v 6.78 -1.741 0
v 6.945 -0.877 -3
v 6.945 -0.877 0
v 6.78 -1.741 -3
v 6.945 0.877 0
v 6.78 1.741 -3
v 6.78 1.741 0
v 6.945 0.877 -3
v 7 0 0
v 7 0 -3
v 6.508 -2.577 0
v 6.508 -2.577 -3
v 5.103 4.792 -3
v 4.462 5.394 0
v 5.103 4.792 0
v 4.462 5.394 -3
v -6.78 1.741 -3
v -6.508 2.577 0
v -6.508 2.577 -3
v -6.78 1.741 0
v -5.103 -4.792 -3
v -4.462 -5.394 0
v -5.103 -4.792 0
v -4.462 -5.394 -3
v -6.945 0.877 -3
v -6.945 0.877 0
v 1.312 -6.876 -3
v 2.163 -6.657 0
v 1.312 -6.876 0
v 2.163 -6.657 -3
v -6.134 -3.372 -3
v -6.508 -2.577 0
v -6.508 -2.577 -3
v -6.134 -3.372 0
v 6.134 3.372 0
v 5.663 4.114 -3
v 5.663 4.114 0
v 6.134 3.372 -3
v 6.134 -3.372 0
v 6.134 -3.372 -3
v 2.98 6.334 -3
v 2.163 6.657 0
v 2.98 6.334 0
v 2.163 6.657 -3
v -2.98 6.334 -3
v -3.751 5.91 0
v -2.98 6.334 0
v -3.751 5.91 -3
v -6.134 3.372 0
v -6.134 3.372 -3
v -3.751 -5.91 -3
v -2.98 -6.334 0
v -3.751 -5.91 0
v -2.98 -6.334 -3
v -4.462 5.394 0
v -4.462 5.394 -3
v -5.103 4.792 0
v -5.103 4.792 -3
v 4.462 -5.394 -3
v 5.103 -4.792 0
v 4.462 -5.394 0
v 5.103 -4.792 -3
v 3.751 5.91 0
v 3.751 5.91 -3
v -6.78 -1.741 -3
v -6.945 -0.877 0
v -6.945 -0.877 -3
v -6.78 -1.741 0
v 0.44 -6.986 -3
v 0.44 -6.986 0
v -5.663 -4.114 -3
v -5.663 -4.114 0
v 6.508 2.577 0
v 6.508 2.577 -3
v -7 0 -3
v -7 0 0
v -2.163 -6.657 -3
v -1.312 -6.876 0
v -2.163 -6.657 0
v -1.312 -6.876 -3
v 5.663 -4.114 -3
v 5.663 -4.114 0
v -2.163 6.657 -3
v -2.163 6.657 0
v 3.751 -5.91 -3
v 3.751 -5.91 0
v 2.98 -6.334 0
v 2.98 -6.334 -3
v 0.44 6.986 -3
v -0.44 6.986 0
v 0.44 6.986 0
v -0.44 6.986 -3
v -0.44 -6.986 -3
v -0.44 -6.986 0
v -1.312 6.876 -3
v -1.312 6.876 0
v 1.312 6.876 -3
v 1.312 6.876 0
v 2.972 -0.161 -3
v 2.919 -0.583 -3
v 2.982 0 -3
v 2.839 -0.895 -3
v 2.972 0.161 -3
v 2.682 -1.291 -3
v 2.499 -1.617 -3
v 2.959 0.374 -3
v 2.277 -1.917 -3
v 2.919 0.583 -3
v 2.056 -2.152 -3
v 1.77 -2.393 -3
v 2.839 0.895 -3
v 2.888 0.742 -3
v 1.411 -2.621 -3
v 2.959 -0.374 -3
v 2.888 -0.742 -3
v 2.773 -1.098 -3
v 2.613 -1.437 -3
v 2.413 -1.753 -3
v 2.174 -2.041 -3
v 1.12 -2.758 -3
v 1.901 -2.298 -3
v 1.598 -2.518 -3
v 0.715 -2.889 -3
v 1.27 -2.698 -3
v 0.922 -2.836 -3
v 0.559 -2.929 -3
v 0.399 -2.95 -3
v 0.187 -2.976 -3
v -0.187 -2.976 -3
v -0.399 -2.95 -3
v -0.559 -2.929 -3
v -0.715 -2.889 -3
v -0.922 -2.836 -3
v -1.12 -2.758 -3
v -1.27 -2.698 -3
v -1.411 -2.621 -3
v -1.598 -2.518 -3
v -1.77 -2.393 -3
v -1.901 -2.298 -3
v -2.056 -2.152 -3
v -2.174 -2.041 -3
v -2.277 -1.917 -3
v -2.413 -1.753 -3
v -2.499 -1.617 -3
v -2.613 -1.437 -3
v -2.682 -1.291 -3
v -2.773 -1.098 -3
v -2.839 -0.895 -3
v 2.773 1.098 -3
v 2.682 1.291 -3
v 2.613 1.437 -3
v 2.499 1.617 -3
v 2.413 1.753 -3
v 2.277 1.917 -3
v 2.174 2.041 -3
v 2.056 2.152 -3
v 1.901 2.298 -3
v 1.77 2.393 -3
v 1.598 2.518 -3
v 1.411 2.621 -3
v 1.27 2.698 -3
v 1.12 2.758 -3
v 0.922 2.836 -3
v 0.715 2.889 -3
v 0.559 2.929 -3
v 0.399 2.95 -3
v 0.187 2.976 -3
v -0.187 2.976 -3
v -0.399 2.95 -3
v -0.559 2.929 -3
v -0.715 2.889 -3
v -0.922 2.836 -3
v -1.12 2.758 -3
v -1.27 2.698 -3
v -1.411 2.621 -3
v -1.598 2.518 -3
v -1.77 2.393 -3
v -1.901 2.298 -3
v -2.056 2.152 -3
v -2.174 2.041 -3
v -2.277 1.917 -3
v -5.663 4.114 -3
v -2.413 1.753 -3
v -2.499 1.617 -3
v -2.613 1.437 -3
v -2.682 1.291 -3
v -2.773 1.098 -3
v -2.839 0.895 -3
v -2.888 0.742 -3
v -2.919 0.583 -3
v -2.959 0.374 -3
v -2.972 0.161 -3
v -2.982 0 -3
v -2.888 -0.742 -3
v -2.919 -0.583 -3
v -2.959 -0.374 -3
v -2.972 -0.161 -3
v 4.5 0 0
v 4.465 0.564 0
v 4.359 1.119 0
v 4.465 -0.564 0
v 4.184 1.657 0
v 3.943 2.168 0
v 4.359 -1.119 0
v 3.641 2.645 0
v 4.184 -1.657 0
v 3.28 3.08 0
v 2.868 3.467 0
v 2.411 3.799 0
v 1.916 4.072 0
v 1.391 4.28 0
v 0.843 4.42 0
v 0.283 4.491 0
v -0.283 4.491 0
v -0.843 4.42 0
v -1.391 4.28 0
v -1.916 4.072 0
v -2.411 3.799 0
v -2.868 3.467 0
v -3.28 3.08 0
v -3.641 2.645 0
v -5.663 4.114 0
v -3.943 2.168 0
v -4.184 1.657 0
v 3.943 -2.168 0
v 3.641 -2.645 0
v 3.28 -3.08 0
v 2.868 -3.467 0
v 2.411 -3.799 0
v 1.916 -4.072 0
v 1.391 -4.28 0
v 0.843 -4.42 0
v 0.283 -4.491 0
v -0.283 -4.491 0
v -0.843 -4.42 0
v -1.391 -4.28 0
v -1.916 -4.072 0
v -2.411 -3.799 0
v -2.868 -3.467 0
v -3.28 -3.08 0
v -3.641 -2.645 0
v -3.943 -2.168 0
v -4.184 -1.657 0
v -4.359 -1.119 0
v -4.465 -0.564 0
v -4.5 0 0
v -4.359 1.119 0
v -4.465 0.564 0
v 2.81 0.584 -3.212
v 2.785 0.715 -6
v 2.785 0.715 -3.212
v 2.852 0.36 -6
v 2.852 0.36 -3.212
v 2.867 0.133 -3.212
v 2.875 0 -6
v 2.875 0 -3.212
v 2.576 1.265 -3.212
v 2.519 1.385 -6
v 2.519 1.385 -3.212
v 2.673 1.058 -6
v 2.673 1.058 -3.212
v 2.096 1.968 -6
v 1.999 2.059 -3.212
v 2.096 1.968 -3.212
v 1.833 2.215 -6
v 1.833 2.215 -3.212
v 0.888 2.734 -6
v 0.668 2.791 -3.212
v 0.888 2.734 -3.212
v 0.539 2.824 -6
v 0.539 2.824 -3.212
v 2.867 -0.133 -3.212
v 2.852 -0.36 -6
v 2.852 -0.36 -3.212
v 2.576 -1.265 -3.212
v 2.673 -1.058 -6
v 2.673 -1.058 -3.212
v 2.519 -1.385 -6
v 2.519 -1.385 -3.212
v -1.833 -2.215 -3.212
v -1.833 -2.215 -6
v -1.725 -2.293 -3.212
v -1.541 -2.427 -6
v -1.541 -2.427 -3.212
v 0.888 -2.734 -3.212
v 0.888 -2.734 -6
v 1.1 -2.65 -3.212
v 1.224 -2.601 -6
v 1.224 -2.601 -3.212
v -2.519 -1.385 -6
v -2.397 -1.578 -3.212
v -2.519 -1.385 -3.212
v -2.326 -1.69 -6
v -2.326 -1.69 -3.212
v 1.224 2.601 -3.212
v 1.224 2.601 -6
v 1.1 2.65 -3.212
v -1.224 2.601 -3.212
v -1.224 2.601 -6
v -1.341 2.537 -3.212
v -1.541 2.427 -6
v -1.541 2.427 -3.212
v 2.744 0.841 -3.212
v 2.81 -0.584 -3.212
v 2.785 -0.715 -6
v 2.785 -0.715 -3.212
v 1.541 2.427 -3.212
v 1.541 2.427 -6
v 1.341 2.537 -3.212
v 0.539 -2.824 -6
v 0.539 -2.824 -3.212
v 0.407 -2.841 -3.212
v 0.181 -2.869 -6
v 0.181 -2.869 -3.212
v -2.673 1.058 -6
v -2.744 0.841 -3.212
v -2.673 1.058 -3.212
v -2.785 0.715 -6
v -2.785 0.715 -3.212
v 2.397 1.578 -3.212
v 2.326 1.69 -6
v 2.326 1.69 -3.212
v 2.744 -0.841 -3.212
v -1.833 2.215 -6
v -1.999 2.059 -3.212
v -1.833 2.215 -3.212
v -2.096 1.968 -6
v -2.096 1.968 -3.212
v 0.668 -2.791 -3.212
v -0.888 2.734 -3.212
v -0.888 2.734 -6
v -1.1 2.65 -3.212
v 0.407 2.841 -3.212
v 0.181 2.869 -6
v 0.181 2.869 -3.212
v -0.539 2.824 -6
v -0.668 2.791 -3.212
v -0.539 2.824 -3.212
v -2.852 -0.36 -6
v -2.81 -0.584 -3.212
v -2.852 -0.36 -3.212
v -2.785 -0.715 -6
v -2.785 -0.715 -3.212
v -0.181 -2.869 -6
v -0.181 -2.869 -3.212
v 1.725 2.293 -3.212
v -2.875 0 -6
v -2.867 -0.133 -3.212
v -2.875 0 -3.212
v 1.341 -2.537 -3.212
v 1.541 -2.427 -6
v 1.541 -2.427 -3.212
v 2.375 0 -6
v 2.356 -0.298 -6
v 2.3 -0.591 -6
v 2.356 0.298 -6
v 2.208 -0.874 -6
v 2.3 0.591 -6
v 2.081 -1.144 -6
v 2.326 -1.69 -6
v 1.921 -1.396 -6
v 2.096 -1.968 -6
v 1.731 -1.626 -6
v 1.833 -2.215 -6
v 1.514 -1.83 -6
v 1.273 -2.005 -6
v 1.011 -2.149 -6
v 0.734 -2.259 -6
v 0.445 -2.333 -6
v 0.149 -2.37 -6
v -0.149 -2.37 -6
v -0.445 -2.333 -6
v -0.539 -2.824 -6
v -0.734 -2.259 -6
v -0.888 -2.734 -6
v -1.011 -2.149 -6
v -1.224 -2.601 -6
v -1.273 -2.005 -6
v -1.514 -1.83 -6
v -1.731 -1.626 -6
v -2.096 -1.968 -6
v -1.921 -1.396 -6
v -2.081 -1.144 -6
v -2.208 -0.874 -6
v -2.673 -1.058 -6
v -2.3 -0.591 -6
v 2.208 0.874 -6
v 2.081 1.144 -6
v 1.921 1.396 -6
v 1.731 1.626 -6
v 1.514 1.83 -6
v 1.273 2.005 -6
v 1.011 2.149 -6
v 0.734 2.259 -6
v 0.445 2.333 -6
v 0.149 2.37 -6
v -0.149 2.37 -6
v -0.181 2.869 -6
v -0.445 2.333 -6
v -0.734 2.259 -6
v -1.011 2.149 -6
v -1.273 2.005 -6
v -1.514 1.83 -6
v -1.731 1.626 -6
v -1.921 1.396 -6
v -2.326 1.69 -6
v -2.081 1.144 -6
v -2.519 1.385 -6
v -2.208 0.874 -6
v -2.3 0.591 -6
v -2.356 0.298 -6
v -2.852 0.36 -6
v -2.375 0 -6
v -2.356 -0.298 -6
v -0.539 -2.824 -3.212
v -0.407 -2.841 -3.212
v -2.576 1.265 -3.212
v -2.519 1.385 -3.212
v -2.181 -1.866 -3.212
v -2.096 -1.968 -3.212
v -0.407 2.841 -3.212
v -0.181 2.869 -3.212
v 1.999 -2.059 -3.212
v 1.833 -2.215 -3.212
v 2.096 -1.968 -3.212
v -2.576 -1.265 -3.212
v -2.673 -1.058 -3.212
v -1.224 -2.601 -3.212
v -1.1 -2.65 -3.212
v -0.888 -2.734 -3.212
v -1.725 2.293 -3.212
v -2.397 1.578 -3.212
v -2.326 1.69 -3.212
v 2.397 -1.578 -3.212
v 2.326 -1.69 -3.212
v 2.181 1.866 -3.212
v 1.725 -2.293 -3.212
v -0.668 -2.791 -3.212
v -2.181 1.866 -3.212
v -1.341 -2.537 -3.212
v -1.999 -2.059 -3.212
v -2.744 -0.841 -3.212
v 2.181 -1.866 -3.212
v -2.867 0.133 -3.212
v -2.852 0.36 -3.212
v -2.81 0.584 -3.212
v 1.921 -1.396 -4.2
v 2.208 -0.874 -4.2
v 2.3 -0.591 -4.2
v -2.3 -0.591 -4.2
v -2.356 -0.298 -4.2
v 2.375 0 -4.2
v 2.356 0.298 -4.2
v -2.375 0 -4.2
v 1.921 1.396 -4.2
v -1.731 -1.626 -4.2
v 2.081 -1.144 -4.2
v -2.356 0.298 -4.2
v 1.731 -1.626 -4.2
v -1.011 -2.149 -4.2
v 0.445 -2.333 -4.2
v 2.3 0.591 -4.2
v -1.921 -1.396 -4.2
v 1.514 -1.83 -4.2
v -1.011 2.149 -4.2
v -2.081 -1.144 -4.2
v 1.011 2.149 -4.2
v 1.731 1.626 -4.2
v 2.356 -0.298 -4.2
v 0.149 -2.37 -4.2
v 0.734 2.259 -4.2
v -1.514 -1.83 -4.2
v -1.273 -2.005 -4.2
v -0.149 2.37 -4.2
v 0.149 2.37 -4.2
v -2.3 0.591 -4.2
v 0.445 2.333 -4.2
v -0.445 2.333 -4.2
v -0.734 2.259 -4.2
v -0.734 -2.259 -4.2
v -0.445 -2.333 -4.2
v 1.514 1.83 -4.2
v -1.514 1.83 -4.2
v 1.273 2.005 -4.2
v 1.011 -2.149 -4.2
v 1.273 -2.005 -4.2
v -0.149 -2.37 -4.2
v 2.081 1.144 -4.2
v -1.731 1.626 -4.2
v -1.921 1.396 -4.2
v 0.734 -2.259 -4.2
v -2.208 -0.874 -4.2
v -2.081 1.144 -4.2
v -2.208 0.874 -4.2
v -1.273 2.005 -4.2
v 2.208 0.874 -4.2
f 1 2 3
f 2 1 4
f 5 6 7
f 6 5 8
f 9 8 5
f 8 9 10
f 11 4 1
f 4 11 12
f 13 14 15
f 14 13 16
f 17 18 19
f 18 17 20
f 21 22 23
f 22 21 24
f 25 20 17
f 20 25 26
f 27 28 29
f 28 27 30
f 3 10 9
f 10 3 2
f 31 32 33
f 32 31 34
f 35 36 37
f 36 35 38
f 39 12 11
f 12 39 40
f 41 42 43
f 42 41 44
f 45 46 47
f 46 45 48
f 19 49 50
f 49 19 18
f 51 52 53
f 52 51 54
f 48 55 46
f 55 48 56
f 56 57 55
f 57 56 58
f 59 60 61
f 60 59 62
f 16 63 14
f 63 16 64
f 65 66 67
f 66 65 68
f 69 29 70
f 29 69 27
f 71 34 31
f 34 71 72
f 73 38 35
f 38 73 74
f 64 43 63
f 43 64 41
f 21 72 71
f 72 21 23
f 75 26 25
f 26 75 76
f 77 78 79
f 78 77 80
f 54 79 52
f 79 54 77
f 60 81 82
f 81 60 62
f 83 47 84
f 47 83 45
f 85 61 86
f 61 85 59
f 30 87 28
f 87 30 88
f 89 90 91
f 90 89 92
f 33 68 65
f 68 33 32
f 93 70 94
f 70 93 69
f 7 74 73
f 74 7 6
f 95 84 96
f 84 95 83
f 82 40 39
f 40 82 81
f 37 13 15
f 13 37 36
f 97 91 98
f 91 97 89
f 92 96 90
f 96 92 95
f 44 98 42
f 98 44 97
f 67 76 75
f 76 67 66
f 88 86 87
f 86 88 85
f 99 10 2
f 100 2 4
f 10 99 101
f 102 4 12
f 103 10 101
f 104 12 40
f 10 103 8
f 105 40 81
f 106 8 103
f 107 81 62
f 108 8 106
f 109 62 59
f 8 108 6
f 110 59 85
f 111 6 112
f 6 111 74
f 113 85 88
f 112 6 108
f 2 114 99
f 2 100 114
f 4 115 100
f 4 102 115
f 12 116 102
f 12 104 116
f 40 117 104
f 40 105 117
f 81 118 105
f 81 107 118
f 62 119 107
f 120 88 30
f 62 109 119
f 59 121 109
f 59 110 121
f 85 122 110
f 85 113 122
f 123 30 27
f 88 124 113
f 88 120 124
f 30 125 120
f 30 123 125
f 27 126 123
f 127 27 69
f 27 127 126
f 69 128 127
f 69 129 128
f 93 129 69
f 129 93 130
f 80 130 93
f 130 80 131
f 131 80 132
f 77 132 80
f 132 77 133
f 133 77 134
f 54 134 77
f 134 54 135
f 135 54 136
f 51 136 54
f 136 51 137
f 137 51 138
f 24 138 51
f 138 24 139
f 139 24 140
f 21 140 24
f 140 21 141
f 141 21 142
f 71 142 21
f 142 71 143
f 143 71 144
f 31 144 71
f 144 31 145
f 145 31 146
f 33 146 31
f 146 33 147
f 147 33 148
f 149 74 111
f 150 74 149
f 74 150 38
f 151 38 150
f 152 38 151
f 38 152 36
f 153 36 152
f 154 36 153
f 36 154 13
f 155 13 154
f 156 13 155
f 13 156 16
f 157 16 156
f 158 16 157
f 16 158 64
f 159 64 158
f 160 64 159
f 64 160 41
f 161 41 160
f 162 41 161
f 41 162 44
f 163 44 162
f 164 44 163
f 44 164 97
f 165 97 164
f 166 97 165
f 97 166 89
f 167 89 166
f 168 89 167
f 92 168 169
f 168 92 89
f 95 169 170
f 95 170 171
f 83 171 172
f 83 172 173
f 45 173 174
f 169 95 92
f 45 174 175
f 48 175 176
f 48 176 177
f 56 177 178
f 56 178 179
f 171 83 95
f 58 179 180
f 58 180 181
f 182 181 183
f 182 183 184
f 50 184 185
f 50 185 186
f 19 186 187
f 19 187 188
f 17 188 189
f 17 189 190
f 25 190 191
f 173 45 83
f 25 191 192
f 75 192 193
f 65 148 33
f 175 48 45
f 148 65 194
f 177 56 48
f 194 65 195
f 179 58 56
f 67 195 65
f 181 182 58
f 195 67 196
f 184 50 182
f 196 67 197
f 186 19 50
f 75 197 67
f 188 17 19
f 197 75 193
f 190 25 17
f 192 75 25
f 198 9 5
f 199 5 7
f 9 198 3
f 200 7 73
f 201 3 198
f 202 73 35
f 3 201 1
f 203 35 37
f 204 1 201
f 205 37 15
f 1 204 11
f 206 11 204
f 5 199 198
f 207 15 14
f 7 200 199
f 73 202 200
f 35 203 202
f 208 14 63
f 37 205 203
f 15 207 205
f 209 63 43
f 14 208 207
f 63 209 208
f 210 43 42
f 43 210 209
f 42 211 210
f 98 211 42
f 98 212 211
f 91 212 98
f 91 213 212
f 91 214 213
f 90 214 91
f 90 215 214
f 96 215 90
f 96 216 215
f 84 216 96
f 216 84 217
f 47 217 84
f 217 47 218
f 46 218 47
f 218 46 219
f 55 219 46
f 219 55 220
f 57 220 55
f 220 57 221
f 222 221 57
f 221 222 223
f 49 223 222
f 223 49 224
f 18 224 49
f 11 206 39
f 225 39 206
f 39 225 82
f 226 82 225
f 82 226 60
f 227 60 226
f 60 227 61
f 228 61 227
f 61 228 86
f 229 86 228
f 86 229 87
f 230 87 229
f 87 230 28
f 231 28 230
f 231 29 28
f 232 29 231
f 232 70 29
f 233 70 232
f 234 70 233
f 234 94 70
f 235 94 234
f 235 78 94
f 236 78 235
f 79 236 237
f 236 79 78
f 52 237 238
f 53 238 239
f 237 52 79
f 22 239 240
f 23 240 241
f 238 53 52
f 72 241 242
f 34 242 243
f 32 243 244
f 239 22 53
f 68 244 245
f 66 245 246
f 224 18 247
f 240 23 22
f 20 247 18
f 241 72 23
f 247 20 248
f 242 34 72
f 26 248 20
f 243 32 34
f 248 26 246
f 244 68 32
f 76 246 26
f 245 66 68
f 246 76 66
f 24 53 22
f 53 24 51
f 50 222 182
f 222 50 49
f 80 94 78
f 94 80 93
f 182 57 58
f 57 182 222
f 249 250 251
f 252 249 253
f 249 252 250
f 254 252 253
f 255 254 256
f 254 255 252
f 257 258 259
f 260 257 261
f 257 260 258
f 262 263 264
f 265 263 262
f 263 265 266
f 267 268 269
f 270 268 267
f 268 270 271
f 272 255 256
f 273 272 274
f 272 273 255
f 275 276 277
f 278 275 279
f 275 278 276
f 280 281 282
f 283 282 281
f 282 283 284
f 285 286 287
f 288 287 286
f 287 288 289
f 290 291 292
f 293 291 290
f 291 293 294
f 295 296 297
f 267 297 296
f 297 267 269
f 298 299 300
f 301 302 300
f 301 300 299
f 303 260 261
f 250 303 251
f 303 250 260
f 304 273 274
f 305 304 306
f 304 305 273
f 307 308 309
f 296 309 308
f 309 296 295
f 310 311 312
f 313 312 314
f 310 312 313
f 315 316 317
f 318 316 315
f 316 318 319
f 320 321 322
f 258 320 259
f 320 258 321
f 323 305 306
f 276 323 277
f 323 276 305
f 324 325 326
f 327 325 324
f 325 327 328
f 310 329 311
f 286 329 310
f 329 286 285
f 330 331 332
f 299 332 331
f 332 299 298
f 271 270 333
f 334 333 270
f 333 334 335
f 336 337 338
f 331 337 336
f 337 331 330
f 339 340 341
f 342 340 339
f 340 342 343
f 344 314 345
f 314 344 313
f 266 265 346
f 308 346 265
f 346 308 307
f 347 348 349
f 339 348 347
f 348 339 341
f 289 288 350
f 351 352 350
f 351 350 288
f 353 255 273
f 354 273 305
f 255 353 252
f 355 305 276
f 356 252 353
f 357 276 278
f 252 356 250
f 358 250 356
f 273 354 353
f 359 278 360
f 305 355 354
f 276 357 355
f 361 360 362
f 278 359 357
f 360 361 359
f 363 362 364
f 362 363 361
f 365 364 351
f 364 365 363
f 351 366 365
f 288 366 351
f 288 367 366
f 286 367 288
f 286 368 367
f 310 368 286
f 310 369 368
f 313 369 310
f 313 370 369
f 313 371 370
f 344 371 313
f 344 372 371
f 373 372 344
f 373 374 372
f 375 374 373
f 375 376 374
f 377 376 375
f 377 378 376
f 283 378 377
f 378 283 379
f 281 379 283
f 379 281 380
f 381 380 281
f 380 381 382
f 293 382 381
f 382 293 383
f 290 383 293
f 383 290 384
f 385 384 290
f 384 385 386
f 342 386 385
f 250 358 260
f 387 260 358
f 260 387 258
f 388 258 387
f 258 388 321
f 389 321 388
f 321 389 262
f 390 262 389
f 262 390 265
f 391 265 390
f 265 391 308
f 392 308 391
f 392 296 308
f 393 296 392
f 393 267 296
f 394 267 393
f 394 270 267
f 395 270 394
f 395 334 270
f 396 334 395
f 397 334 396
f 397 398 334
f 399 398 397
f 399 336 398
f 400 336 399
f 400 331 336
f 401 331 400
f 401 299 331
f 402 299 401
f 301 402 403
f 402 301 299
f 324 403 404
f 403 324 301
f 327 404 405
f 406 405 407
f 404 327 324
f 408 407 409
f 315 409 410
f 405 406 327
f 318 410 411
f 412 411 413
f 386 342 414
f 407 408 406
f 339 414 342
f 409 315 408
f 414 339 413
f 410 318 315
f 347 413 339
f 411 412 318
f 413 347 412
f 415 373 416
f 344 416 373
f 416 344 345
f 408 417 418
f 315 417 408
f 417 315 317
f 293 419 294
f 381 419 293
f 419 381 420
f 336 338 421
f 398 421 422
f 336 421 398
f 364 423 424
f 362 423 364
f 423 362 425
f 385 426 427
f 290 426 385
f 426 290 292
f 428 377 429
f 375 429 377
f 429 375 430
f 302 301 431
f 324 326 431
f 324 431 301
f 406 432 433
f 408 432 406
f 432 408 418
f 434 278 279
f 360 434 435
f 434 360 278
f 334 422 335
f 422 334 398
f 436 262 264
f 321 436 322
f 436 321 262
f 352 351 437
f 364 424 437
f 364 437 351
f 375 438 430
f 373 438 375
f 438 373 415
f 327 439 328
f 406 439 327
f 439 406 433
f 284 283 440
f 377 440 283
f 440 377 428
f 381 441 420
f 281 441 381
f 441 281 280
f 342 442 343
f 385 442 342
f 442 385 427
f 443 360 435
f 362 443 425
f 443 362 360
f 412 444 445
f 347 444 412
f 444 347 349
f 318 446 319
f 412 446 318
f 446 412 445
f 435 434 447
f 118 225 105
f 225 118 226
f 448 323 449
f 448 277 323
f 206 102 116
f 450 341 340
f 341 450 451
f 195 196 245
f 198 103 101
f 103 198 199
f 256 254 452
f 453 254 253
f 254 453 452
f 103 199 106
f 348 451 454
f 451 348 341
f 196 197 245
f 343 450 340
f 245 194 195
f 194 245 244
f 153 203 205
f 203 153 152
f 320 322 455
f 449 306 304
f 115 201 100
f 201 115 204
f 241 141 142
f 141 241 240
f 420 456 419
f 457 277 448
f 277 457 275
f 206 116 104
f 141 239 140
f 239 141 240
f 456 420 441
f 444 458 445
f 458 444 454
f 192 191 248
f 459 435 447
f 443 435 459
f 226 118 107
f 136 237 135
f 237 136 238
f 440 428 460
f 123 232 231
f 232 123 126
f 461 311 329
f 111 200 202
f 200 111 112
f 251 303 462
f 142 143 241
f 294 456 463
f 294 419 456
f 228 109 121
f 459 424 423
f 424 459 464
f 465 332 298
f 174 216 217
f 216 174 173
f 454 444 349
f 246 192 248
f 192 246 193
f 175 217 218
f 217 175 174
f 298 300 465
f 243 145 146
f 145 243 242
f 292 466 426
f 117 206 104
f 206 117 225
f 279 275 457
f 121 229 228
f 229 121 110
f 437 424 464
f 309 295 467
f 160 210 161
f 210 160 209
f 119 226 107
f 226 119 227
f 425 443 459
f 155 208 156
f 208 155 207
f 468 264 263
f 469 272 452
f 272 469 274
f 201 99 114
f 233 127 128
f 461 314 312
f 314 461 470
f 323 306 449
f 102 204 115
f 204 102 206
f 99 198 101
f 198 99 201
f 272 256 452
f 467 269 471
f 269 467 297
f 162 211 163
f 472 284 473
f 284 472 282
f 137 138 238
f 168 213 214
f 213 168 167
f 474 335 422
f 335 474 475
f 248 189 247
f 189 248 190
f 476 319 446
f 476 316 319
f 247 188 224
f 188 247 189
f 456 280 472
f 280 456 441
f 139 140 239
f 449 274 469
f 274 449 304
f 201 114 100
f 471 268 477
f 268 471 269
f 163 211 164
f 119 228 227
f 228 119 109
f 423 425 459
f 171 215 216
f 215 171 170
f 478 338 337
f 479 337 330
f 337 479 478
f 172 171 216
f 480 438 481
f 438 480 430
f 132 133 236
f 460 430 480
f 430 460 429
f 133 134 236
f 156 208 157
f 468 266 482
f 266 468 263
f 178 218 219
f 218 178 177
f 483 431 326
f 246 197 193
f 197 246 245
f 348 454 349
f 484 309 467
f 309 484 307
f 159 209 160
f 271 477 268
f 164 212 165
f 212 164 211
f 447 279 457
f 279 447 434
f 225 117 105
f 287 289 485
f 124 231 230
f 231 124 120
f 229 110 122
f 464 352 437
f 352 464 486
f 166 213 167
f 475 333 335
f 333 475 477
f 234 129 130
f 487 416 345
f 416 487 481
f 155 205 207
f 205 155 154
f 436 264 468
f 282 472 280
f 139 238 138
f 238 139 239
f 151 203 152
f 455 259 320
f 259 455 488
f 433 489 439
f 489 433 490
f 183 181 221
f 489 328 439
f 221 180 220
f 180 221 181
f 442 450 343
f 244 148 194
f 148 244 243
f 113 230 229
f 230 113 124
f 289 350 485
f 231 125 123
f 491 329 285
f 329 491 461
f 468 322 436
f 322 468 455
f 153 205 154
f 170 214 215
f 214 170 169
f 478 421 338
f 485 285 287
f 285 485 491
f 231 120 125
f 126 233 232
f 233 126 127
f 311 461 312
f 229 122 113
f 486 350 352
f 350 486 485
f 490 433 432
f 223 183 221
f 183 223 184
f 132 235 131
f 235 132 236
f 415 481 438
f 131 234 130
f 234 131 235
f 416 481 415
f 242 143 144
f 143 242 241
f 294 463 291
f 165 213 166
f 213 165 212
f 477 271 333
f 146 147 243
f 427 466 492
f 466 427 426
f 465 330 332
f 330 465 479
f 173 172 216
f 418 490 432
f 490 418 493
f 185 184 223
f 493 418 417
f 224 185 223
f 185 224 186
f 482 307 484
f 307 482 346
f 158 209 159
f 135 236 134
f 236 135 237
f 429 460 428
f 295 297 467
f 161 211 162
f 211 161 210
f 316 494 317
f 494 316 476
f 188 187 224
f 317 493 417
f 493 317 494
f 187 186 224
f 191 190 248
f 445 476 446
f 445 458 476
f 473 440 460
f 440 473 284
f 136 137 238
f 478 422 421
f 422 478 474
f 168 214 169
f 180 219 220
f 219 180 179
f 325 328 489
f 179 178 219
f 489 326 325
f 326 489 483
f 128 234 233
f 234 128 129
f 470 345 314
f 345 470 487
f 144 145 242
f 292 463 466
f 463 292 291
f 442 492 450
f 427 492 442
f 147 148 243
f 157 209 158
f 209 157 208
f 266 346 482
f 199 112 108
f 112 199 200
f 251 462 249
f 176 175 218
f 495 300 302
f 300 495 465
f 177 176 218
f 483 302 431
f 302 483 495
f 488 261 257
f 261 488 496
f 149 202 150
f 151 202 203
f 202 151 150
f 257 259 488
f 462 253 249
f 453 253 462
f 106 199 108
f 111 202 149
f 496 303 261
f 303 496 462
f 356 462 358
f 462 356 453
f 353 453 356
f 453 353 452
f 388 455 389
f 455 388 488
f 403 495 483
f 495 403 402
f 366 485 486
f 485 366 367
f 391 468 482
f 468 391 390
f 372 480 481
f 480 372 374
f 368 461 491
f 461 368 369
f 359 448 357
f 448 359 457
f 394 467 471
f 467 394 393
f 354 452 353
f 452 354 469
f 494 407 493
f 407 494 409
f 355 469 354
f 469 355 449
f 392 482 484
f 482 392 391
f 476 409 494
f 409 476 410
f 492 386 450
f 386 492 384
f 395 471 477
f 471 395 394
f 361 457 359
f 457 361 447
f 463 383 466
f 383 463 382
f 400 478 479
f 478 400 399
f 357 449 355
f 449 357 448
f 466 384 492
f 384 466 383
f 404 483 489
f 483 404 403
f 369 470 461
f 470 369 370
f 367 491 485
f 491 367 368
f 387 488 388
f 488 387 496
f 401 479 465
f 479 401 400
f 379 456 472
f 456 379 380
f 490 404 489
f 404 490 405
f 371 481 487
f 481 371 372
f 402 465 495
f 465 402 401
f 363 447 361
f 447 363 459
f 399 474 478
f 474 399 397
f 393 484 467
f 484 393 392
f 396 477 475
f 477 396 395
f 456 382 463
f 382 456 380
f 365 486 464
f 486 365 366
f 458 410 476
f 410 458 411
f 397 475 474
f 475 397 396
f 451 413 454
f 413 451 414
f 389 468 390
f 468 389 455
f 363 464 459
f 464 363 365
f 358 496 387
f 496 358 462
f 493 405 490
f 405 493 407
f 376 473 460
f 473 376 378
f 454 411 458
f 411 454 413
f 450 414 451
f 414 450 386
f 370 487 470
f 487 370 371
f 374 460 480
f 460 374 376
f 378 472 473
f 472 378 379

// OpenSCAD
$fn = 50;

difference() {
	union() {
		translate(v = [0, 0, -3.0]) {
			cylinder(h = 3, r = 7.0);
		}
		#translate(v = [0, 0, -6.0]) {
			cylinder(h = 6, r = 2.875);
		}
	}
	union() {
		translate(v = [0, 0, 0]) {
			rotate(a = [0, 0, 0]) {
				difference() {
					union() {
						translate(v = [0, 0, -6.0]) {
							cylinder(h = 6, r = 2.25);
						}
						translate(v = [0, 0, -4.2]) {
							cylinder(h = 4.2, r1 = 2.375, r2 = 4.5);
						}
						translate(v = [0, 0, -6.0]) {
							cylinder(h = 6, r = 2.375);
						}
						translate(v = [0, 0, -6.0]) {
							cylinder(h = 6, r = 2.25);
						}
					}
					union();
				}
			}
		}
	}
}
